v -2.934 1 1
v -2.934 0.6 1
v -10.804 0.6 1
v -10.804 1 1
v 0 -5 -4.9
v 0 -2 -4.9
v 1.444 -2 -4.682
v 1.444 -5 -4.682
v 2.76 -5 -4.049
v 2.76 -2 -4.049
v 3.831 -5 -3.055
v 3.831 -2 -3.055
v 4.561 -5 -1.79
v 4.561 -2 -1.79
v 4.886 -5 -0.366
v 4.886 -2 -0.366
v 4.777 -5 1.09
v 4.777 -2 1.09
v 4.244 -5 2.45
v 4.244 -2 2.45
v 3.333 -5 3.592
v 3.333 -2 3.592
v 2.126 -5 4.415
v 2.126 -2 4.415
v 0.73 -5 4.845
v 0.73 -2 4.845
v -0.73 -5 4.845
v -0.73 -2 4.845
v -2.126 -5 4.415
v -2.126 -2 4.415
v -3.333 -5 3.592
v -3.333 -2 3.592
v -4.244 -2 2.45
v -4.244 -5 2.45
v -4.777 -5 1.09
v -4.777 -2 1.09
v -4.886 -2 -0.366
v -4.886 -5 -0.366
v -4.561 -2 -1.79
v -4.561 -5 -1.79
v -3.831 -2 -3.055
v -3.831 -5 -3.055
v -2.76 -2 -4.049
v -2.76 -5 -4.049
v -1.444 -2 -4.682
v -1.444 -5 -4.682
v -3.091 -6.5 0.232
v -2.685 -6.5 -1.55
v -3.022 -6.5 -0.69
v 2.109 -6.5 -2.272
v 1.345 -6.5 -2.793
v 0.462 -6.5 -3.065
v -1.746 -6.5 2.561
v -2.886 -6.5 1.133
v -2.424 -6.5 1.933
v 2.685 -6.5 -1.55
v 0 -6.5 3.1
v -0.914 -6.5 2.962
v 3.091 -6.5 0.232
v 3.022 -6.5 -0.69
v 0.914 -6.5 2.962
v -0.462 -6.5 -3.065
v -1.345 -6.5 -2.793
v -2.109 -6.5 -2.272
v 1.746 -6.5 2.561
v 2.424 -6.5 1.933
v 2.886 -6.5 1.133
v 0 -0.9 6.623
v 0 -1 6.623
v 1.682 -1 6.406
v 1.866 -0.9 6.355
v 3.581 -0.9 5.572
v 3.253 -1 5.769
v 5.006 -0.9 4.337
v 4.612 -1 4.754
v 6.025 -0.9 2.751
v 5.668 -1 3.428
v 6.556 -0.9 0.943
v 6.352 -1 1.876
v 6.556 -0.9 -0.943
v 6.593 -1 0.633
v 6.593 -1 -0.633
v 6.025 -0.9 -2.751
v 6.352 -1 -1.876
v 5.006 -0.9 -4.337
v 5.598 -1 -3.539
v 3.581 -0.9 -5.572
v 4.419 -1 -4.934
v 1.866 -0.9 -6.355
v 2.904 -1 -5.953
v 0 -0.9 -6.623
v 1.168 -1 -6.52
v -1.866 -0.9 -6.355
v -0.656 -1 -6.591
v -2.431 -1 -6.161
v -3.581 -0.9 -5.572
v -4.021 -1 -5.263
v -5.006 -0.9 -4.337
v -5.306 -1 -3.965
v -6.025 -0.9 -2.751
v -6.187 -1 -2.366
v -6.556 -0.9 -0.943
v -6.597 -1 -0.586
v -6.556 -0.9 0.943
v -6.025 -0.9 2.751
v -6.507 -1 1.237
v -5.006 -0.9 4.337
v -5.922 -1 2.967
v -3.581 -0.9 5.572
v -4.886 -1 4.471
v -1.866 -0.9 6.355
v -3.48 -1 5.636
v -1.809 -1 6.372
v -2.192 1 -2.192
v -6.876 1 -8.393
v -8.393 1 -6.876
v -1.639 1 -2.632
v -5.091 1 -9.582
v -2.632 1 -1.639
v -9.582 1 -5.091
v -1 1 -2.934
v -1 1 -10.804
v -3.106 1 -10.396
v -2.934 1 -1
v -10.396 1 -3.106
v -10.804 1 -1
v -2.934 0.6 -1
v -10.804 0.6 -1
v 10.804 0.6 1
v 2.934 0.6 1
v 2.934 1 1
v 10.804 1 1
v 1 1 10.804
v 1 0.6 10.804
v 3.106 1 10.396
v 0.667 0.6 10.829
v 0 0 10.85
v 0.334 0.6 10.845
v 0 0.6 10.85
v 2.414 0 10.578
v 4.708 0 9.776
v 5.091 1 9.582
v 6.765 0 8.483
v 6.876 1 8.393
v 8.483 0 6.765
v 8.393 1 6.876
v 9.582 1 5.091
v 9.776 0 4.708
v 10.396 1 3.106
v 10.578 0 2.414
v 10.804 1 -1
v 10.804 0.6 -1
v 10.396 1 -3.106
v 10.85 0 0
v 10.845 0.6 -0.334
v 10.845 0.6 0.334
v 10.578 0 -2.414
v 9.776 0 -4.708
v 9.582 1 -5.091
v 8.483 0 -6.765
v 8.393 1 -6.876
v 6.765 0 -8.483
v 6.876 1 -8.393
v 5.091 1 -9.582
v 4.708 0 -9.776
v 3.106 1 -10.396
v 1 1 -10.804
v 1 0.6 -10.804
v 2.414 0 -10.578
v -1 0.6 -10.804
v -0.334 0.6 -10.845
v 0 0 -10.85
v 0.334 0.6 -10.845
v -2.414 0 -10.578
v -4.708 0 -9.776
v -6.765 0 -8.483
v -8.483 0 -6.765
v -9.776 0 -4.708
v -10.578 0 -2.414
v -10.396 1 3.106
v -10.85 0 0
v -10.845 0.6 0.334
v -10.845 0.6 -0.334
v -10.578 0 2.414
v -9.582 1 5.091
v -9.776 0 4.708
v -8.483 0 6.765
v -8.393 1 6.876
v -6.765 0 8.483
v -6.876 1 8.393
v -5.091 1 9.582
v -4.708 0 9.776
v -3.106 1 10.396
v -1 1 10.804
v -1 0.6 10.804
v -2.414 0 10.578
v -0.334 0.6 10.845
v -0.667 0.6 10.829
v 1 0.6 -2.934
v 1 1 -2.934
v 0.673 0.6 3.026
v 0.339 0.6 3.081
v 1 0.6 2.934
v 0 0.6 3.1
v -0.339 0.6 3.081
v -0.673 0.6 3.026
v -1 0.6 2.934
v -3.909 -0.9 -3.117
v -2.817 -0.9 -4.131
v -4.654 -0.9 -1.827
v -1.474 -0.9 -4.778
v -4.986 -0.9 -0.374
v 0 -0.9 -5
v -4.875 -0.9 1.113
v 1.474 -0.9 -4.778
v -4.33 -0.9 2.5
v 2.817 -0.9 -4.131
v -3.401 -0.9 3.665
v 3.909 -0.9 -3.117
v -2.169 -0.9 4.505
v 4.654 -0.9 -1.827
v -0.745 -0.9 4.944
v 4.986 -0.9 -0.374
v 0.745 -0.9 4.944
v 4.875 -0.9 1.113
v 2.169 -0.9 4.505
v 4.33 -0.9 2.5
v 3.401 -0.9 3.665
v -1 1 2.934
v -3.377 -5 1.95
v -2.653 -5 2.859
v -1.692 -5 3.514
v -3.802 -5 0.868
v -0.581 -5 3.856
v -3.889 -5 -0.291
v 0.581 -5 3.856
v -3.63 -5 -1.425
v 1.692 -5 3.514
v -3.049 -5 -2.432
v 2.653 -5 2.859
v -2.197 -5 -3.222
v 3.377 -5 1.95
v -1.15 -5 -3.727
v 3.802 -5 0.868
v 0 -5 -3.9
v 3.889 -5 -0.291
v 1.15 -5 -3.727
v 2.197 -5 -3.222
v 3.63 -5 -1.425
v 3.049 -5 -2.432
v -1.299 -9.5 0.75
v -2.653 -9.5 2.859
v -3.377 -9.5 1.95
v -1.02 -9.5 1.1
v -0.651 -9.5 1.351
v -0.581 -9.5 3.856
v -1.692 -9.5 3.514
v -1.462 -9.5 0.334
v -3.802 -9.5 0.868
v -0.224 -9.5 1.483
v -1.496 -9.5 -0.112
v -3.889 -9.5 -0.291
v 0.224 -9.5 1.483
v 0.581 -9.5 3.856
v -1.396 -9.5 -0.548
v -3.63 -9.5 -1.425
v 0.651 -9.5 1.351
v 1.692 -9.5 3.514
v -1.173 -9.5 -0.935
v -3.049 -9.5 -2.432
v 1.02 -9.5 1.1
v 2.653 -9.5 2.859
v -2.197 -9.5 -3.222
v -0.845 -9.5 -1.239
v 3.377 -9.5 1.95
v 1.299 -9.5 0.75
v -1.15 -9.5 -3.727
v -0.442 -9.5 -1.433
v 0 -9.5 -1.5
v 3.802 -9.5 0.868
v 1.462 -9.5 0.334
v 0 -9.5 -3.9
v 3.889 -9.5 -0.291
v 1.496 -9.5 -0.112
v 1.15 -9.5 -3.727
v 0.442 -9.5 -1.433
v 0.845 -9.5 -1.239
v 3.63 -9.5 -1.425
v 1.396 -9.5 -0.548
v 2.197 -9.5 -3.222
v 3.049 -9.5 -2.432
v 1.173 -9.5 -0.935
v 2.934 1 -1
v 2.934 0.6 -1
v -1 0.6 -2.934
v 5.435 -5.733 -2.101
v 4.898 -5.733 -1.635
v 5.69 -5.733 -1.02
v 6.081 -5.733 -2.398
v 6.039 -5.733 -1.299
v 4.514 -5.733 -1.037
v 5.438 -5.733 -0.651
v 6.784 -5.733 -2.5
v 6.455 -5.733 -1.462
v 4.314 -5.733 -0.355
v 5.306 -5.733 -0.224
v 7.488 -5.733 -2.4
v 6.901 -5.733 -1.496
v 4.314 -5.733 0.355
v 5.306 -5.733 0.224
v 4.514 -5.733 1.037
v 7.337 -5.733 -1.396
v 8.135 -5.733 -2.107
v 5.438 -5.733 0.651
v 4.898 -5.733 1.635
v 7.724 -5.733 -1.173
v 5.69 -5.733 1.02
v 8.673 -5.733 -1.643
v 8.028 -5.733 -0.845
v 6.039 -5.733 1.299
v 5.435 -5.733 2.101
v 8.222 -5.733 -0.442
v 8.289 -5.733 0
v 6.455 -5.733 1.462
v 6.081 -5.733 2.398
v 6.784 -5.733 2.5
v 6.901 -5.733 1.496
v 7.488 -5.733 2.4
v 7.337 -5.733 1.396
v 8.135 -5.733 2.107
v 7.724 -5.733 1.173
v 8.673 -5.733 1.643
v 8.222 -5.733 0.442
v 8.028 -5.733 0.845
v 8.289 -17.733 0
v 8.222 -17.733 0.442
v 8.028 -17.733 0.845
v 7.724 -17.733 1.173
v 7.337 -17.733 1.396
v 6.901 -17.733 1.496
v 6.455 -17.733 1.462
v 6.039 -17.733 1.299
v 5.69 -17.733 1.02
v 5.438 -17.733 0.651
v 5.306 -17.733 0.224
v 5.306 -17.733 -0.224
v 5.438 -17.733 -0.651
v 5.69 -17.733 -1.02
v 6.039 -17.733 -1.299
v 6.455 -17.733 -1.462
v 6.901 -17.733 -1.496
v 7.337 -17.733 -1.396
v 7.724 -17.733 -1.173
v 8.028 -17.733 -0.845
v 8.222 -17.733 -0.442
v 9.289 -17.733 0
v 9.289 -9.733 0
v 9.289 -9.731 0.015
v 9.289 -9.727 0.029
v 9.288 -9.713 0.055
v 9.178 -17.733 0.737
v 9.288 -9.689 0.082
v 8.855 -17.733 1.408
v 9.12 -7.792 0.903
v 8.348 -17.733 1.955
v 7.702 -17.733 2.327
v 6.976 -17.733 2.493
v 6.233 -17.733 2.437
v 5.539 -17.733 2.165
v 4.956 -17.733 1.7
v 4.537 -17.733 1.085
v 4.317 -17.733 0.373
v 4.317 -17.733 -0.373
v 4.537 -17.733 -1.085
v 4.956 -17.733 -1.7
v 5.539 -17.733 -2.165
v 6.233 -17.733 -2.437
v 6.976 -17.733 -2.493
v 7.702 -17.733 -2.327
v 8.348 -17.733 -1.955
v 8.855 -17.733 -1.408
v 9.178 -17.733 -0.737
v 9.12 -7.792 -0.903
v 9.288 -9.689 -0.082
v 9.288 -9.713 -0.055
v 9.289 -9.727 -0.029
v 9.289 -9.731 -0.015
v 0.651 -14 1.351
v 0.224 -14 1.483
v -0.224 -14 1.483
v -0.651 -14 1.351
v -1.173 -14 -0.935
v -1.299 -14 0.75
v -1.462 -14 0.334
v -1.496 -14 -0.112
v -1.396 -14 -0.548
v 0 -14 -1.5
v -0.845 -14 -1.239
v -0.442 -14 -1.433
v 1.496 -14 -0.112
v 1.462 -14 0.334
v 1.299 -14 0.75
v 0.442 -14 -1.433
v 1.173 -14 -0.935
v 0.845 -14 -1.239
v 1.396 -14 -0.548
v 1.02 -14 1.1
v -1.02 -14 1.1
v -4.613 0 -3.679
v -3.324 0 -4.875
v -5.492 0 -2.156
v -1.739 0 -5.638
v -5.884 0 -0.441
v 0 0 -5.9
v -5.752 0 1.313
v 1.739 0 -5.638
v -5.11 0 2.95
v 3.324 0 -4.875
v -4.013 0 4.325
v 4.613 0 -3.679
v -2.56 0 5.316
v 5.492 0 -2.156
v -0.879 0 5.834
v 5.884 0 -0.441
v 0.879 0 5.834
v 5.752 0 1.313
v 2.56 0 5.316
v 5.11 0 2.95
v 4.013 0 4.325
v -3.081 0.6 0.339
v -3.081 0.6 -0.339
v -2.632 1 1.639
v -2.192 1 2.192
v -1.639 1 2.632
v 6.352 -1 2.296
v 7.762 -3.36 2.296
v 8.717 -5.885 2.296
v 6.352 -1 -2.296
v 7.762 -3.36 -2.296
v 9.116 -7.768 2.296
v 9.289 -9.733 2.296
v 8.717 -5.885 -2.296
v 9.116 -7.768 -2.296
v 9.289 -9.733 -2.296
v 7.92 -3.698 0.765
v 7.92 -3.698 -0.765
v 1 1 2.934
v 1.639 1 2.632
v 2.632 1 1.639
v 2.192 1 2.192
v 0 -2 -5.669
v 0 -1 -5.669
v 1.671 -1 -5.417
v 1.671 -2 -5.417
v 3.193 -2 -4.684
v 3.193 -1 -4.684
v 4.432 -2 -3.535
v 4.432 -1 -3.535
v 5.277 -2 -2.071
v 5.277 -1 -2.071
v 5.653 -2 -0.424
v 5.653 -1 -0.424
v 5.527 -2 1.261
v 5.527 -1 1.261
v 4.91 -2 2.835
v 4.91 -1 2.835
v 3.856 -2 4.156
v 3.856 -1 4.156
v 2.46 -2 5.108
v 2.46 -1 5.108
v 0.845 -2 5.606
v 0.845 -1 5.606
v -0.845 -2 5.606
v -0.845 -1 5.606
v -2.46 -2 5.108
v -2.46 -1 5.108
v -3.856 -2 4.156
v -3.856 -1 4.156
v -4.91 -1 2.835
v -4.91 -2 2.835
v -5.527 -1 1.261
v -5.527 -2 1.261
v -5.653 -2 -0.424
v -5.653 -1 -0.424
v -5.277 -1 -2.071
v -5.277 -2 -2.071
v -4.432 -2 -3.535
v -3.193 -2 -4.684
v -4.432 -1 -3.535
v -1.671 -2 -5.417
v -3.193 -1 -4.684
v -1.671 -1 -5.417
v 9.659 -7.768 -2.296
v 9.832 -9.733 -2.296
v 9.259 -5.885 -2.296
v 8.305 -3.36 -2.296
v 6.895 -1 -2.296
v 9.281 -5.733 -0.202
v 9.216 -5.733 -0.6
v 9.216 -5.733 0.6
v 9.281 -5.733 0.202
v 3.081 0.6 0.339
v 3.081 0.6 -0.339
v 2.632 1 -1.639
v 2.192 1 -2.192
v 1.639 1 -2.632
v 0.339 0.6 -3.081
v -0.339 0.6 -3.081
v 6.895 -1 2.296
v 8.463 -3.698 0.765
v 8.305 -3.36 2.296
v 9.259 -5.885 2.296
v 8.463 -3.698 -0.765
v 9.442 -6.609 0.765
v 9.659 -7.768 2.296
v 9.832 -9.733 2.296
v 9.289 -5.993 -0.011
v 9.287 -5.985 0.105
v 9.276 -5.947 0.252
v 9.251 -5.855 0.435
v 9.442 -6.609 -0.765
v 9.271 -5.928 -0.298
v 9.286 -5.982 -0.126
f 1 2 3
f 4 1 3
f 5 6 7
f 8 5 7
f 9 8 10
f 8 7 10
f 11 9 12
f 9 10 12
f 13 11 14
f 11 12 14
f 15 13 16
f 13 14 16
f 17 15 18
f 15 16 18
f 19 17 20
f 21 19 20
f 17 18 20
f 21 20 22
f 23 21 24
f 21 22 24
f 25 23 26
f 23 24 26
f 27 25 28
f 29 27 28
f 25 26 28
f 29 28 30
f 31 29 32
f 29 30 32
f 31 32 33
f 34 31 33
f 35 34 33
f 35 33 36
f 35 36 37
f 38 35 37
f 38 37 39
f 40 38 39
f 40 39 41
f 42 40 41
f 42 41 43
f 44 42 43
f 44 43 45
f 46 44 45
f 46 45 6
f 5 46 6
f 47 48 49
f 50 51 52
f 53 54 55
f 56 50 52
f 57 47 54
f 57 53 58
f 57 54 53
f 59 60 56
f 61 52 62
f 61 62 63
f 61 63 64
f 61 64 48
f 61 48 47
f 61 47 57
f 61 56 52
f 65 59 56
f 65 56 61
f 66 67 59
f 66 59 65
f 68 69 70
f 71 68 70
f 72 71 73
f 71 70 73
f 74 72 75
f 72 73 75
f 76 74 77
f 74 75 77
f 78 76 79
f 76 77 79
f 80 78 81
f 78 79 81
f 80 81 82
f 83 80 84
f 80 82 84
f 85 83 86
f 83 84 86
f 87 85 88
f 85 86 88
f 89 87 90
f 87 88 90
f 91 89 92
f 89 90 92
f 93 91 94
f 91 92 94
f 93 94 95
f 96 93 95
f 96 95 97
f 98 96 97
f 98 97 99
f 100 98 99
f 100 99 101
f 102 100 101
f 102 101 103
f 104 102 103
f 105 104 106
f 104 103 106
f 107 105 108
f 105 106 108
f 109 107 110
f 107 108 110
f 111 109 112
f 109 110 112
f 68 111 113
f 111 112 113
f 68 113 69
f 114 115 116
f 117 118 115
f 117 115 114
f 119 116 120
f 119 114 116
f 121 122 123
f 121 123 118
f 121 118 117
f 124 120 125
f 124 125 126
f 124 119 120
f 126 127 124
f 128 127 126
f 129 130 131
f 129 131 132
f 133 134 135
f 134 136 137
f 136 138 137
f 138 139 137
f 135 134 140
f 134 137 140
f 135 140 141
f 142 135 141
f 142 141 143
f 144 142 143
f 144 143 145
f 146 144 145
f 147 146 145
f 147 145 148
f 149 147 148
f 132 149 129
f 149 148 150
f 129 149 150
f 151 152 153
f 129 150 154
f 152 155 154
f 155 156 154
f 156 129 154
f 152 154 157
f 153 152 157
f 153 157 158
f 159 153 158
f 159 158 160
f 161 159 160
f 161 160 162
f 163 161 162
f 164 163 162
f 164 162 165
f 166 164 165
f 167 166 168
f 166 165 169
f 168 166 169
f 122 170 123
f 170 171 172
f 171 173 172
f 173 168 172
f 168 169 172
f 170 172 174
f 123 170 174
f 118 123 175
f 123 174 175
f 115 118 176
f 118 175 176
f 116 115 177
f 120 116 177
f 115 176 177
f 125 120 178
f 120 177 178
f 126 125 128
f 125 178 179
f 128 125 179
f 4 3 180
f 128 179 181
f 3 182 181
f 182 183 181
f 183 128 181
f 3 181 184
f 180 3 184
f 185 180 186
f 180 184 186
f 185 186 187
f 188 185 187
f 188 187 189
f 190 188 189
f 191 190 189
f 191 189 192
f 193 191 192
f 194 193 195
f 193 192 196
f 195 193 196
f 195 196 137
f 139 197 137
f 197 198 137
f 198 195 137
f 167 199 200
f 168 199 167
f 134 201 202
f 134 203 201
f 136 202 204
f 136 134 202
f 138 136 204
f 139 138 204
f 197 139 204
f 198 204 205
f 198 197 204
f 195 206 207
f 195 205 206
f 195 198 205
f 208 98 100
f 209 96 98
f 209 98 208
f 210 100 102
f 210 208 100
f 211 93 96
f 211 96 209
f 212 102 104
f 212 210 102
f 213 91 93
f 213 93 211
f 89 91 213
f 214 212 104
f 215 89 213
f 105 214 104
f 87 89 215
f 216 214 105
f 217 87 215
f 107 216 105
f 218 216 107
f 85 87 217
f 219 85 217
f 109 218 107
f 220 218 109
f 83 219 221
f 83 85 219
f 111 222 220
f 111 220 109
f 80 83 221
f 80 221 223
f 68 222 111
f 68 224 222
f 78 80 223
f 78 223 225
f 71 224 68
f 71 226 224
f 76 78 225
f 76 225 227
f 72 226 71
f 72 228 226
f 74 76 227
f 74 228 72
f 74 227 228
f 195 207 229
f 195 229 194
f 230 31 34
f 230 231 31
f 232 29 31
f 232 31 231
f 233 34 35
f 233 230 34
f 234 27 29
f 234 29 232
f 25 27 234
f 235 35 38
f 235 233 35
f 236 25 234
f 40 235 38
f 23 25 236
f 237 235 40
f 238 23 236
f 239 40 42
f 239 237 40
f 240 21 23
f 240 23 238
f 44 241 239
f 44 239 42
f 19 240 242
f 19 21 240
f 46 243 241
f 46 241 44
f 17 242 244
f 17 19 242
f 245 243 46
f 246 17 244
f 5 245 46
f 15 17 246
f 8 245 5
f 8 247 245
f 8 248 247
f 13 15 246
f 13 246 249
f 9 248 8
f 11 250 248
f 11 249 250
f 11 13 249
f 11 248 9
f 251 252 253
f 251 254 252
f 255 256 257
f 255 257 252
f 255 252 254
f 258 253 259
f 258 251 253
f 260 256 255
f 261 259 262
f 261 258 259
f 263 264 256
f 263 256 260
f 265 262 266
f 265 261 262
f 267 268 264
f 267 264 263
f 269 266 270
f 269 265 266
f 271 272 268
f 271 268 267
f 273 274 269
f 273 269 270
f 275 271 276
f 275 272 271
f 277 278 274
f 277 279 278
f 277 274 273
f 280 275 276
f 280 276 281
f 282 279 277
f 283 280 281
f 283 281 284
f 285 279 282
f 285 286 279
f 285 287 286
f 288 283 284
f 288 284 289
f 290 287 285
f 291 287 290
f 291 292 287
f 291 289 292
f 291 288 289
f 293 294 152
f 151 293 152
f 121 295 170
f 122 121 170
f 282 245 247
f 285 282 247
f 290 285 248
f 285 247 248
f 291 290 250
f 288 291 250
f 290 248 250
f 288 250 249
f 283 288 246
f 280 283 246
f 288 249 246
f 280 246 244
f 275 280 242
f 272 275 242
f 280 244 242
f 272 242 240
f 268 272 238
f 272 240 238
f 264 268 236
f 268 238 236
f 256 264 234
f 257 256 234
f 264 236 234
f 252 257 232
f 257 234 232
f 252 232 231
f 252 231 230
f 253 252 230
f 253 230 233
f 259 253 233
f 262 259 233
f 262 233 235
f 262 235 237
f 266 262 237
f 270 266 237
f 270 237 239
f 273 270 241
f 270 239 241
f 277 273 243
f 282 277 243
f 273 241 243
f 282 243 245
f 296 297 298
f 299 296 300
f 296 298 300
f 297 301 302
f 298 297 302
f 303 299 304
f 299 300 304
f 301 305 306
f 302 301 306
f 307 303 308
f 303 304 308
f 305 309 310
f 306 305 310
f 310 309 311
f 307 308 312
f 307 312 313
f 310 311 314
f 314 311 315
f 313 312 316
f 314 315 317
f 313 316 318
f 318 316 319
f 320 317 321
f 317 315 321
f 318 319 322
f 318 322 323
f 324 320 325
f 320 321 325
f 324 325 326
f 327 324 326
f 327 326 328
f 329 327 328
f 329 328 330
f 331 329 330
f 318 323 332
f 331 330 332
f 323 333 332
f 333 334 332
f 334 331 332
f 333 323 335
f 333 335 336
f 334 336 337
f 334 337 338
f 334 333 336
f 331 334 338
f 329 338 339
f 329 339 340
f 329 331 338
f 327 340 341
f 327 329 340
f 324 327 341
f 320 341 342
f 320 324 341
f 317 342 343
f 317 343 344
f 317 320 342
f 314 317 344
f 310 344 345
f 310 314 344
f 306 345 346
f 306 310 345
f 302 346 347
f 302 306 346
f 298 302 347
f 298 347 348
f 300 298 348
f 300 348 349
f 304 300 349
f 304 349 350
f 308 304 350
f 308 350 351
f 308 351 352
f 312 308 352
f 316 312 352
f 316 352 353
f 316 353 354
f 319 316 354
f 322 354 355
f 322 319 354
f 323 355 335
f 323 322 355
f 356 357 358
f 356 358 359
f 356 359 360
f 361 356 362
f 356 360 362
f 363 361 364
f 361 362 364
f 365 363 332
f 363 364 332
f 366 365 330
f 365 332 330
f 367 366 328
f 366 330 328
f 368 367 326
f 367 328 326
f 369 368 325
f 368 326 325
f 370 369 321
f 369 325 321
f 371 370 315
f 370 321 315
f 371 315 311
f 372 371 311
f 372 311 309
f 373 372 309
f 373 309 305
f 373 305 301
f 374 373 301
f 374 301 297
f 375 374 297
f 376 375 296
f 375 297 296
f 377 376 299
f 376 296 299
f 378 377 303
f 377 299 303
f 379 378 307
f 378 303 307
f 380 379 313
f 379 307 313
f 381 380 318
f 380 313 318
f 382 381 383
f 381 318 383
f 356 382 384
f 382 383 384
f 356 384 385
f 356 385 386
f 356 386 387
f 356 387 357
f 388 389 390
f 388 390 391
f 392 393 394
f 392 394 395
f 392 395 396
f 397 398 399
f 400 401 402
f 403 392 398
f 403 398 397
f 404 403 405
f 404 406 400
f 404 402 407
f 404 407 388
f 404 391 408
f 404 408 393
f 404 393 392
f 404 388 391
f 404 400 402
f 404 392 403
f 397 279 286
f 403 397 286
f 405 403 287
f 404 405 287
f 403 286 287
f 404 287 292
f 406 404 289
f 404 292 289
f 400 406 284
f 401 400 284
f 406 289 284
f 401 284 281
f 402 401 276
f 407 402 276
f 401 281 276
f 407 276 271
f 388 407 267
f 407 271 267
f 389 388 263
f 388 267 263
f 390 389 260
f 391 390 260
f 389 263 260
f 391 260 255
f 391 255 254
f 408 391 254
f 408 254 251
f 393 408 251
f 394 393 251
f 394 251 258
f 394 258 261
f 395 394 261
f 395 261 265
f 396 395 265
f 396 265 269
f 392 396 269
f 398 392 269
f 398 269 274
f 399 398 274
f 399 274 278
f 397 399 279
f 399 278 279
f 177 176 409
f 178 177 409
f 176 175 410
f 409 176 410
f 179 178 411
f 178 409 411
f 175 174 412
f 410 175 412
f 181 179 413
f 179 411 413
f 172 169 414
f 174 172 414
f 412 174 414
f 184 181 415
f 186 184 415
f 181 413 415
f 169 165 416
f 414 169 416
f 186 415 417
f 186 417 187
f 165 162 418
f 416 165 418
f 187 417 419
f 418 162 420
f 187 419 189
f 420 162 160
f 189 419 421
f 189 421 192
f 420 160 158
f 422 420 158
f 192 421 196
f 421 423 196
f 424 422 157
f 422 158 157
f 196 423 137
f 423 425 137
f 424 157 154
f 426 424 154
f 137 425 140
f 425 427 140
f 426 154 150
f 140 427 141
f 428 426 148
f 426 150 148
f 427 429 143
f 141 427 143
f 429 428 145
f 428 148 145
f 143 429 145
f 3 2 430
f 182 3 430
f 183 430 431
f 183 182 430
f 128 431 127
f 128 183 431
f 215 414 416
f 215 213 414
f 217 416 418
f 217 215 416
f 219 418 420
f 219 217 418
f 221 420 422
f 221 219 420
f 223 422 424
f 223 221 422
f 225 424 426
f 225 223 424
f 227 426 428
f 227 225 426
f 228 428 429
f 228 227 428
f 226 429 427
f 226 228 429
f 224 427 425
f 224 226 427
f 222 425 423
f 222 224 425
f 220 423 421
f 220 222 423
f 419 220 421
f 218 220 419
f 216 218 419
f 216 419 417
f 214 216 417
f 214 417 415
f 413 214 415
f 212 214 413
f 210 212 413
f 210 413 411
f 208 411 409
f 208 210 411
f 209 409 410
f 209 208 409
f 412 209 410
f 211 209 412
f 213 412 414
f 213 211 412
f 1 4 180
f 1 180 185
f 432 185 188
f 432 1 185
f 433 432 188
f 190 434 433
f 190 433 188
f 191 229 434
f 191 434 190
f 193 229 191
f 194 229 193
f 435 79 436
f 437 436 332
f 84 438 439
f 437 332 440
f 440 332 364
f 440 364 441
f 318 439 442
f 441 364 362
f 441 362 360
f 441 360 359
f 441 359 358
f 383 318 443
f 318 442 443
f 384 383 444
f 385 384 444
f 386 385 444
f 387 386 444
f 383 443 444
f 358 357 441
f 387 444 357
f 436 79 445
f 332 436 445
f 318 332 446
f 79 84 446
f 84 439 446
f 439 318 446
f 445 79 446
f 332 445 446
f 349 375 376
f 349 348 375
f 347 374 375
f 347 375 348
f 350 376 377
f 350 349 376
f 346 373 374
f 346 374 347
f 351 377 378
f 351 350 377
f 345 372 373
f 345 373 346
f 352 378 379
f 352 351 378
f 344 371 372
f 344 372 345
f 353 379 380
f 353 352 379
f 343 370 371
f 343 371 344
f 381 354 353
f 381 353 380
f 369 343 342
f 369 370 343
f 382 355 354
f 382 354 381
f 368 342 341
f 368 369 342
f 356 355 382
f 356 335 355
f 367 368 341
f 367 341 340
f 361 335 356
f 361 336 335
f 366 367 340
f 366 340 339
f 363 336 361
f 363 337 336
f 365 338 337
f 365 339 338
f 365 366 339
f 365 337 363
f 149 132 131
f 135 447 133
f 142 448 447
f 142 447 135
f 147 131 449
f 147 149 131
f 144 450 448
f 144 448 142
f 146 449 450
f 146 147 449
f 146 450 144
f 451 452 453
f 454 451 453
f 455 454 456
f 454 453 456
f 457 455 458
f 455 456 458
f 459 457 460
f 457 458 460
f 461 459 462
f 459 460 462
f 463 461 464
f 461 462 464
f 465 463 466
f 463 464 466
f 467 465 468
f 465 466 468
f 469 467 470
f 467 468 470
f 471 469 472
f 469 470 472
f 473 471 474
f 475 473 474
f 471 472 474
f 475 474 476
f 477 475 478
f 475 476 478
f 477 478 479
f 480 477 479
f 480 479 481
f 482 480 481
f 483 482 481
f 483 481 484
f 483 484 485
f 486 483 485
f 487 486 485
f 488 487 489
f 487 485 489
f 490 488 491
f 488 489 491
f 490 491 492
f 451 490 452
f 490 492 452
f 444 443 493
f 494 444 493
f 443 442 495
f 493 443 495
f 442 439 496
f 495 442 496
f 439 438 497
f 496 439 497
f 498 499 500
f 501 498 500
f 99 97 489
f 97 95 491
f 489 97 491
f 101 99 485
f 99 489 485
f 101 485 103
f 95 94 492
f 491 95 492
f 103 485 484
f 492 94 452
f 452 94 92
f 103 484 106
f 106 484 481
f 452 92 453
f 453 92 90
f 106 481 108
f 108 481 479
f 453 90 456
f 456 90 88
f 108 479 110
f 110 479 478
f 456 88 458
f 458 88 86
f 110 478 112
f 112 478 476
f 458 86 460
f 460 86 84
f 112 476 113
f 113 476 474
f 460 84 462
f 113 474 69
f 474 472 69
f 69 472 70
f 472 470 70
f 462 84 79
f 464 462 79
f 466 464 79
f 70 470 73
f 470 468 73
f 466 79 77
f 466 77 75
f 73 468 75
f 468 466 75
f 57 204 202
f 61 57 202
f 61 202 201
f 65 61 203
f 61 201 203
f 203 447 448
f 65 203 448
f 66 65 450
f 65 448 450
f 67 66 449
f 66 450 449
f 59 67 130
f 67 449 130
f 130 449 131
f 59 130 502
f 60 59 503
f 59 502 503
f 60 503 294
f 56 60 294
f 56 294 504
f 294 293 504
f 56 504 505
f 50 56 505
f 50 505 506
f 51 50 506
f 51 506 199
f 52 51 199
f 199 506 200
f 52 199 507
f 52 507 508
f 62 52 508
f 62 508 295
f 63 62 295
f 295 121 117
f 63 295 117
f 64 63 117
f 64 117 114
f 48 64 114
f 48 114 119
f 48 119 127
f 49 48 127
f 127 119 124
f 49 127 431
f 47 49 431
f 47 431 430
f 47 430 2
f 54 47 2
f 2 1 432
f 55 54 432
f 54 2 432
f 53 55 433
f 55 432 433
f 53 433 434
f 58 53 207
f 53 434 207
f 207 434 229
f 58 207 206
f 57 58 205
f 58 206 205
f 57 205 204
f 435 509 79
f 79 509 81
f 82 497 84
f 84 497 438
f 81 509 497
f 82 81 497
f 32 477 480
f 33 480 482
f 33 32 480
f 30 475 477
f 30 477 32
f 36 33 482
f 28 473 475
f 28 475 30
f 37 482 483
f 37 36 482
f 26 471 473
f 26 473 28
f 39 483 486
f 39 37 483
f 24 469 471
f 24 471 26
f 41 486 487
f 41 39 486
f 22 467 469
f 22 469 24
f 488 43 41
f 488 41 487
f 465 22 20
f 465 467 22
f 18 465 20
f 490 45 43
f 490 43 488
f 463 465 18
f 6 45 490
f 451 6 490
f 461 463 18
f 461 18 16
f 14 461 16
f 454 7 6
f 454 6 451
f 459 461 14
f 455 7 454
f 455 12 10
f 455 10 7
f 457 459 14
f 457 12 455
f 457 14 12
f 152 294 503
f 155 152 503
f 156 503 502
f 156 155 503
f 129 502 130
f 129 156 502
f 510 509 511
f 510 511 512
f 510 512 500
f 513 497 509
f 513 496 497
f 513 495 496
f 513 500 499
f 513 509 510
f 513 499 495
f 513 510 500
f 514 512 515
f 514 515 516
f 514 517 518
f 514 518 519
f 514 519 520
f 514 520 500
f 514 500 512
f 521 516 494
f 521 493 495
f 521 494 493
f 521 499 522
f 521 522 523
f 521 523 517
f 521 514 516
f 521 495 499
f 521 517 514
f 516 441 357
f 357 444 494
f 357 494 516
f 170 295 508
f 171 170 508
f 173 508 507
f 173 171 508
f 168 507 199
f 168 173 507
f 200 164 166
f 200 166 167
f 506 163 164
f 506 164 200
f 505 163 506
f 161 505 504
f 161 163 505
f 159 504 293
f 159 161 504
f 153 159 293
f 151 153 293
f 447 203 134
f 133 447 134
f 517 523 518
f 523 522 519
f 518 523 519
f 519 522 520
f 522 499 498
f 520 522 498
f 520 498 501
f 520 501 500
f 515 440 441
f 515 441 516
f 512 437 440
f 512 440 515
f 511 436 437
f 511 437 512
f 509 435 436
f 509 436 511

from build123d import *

# Parameters (mm, degrees)
SKETCH1_R                = 10.85
BOSS_EXTRUDE1_DEPTH      = 1
SKETCH2_R                = 4.9
BOSS_EXTRUDE2_DEPTH      = 5
SKETCH3_R                = 3.9
BOSS_EXTRUDE3_DEPTH      = 4.5
SKETCH4_R                = 1.5
BOSS_EXTRUDE4_DEPTH      = 4.5
CHAMFER1_SIZE            = 1
SKETCH5_R                = 3.1
CUT_EXTRUDE1_DEPTH       = 7.5
CUT_EXTRUDE_THIN2_START  = -0.4
SKETCH6_W                = 2
SKETCH6_H                = 21.149646587
CUT_EXTRUDE_THIN2_DEPTH  = 22.857982198
CIRPATTERN1_COUNT        = 4
SKETCH8_R                = 5.669003214
SKETCH8_R_2              = 4.883775851
BOSS_EXTRUDE5_DEPTH      = 1
SKETCH10_R               = 6.62346743
SKETCH10_R_2             = 4.788629078
BOSS_EXTRUDE6_DEPTH      = 0.1
SWEEP1_START             = -2.295822316
SWEEP1_DEPTH             = 4.591644632
EXTRUDE_THIN1_DEPTH      = 8
EXTRUDE_THIN1_DEPTH_BACK = 4
SKETCH13_R               = 2.5
SKETCH13_R_2             = 1.5


# Read off the part's stored shape, not the designer's step: Sweep1
with BuildPart() as part:
    # Sketch1 → Boss-Extrude1 (new body)
    with BuildSketch(Plane(origin=(0, 0, 0), x_dir=(1, 0, 0), z_dir=(0, 1, 0))):
        with Locations(Location((0, 0, 0), (0, 0, 270))):
            Circle(SKETCH1_R)
    extrude(amount=BOSS_EXTRUDE1_DEPTH)

    # Sketch2 → Boss-Extrude2 (add)
    with BuildSketch(Plane.XZ):
        with Locations(Location((0, 0, 0), (0, 0, 270))):
            Circle(SKETCH2_R)
    extrude(amount=BOSS_EXTRUDE2_DEPTH)

    # Sketch3 → Boss-Extrude3 (add)
    with BuildSketch(Plane.XZ.offset(5)):
        with Locations(Location((0, 0, 0), (0, 0, 270))):
            Circle(SKETCH3_R)
    extrude(amount=BOSS_EXTRUDE3_DEPTH)

    # Sketch4 → Boss-Extrude4 (add)
    with BuildSketch(Plane.XZ.offset(9.5)):
        with Locations(Location((0, 0, 0), (0, 0, 270))):
            Circle(SKETCH4_R)
    extrude(amount=BOSS_EXTRUDE4_DEPTH)

    # Chamfer1
    chamfer1_edges = [part.edges().sort_by_distance(p)[0] for p in [
        (0, 0, 4.9),
    ]]
    chamfer(chamfer1_edges, length=CHAMFER1_SIZE)

    # Sketch5 → Cut-Extrude1 (cut)
    with BuildSketch(Plane(origin=(0, 1, 0), x_dir=(1, 0, 0), z_dir=(0, 1, 0))):
        with Locations(Location((0, 0, 0), (0, 0, 270))):
            Circle(SKETCH5_R)
    extrude(amount=-CUT_EXTRUDE1_DEPTH, mode=Mode.SUBTRACT)

    # Sketch6 → Cut-Extrude-Thin2 (cut)
    with BuildSketch(Plane(origin=(0, 1, 0), x_dir=(1, 0, 0), z_dir=(0, 1, 0)).offset(CUT_EXTRUDE_THIN2_START)):
        with Locations((0, 10.574823294)):
            Rectangle(SKETCH6_W, SKETCH6_H)
    cut_extrude_thin2 = extrude(amount=CUT_EXTRUDE_THIN2_DEPTH, mode=Mode.SUBTRACT)

    # CirPattern1: Cut-Extrude-Thin2 ×4 about axis
    cirpattern1_axis = Axis((0, 0, 0), (0, 1, 0))
    for i in range(1, CIRPATTERN1_COUNT):
        add(cut_extrude_thin2.rotate(cirpattern1_axis, i * 360 / CIRPATTERN1_COUNT), mode=Mode.SUBTRACT)

    # Sketch8 → Boss-Extrude5 (add)
    with BuildSketch(Plane(origin=(0, -1, 0), x_dir=(-1, 0, 0), z_dir=(0, -1, 0))):
        with Locations(Location((0, 0, 0), (0, 0, 90))):
            Circle(SKETCH8_R)
        Circle(SKETCH8_R_2, mode=Mode.SUBTRACT)
    extrude(amount=BOSS_EXTRUDE5_DEPTH)



with BuildPart() as body_2:
    # Sketch10 → Boss-Extrude6 (new body)
    with BuildSketch(Plane(origin=(0, -1, 0), x_dir=(1, 0, 0), z_dir=(0, 1, 0))):
        with Locations(Location((0, 0, 0), (0, 0, 270))):
            Circle(SKETCH10_R)
        with Locations(Location((0, 0, 0), (0, 0, 270))):
            Circle(SKETCH10_R_2, mode=Mode.SUBTRACT)
    extrude(amount=BOSS_EXTRUDE6_DEPTH)

    # Sweep1 outline → Sweep1 (add)
    with BuildSketch(Plane.XY.offset(SWEEP1_START)):
        with BuildLine():
            Line((6.894755274, -1), (6.352179586, -1))
            add(Edge.make_bspline(
                [(6.352179586, -1), (8.215144945, -3.590953031), (9.19411107, -6.50188171), (9.289077959, -9.732786039)],
                knots=[0, 0, 0, 0, 1, 1, 1, 1], degree=3))
            Line((9.289077959, -9.732786039), (9.831653647, -9.732786039))
            add(Edge.make_bspline(
                [(6.894755274, -1), (8.757720633, -3.590953031), (9.736686757, -6.50188171), (9.831653647, -9.732786039)],
                knots=[0, 0, 0, 0, 1, 1, 1, 1], degree=3))
        make_face()
    extrude(amount=SWEEP1_DEPTH)


with BuildPart() as part_1:
    add(part.part)

    add(body_2.part)  # Extrude-Thin1 merges body 2
    # Sketch13 → Extrude-Thin1 (add, two sides: drawn at the far end of the back side and taken through both)
    with BuildSketch(Plane.XZ.offset(9.732786039).offset(-EXTRUDE_THIN1_DEPTH_BACK)):
        with Locations((6.789077959, 0)):
            Circle(SKETCH13_R)
        with Locations((6.789077959, 0)):
            Circle(SKETCH13_R_2, mode=Mode.SUBTRACT)
    extrude(amount=EXTRUDE_THIN1_DEPTH + EXTRUDE_THIN1_DEPTH_BACK)


solid = part_1.part
